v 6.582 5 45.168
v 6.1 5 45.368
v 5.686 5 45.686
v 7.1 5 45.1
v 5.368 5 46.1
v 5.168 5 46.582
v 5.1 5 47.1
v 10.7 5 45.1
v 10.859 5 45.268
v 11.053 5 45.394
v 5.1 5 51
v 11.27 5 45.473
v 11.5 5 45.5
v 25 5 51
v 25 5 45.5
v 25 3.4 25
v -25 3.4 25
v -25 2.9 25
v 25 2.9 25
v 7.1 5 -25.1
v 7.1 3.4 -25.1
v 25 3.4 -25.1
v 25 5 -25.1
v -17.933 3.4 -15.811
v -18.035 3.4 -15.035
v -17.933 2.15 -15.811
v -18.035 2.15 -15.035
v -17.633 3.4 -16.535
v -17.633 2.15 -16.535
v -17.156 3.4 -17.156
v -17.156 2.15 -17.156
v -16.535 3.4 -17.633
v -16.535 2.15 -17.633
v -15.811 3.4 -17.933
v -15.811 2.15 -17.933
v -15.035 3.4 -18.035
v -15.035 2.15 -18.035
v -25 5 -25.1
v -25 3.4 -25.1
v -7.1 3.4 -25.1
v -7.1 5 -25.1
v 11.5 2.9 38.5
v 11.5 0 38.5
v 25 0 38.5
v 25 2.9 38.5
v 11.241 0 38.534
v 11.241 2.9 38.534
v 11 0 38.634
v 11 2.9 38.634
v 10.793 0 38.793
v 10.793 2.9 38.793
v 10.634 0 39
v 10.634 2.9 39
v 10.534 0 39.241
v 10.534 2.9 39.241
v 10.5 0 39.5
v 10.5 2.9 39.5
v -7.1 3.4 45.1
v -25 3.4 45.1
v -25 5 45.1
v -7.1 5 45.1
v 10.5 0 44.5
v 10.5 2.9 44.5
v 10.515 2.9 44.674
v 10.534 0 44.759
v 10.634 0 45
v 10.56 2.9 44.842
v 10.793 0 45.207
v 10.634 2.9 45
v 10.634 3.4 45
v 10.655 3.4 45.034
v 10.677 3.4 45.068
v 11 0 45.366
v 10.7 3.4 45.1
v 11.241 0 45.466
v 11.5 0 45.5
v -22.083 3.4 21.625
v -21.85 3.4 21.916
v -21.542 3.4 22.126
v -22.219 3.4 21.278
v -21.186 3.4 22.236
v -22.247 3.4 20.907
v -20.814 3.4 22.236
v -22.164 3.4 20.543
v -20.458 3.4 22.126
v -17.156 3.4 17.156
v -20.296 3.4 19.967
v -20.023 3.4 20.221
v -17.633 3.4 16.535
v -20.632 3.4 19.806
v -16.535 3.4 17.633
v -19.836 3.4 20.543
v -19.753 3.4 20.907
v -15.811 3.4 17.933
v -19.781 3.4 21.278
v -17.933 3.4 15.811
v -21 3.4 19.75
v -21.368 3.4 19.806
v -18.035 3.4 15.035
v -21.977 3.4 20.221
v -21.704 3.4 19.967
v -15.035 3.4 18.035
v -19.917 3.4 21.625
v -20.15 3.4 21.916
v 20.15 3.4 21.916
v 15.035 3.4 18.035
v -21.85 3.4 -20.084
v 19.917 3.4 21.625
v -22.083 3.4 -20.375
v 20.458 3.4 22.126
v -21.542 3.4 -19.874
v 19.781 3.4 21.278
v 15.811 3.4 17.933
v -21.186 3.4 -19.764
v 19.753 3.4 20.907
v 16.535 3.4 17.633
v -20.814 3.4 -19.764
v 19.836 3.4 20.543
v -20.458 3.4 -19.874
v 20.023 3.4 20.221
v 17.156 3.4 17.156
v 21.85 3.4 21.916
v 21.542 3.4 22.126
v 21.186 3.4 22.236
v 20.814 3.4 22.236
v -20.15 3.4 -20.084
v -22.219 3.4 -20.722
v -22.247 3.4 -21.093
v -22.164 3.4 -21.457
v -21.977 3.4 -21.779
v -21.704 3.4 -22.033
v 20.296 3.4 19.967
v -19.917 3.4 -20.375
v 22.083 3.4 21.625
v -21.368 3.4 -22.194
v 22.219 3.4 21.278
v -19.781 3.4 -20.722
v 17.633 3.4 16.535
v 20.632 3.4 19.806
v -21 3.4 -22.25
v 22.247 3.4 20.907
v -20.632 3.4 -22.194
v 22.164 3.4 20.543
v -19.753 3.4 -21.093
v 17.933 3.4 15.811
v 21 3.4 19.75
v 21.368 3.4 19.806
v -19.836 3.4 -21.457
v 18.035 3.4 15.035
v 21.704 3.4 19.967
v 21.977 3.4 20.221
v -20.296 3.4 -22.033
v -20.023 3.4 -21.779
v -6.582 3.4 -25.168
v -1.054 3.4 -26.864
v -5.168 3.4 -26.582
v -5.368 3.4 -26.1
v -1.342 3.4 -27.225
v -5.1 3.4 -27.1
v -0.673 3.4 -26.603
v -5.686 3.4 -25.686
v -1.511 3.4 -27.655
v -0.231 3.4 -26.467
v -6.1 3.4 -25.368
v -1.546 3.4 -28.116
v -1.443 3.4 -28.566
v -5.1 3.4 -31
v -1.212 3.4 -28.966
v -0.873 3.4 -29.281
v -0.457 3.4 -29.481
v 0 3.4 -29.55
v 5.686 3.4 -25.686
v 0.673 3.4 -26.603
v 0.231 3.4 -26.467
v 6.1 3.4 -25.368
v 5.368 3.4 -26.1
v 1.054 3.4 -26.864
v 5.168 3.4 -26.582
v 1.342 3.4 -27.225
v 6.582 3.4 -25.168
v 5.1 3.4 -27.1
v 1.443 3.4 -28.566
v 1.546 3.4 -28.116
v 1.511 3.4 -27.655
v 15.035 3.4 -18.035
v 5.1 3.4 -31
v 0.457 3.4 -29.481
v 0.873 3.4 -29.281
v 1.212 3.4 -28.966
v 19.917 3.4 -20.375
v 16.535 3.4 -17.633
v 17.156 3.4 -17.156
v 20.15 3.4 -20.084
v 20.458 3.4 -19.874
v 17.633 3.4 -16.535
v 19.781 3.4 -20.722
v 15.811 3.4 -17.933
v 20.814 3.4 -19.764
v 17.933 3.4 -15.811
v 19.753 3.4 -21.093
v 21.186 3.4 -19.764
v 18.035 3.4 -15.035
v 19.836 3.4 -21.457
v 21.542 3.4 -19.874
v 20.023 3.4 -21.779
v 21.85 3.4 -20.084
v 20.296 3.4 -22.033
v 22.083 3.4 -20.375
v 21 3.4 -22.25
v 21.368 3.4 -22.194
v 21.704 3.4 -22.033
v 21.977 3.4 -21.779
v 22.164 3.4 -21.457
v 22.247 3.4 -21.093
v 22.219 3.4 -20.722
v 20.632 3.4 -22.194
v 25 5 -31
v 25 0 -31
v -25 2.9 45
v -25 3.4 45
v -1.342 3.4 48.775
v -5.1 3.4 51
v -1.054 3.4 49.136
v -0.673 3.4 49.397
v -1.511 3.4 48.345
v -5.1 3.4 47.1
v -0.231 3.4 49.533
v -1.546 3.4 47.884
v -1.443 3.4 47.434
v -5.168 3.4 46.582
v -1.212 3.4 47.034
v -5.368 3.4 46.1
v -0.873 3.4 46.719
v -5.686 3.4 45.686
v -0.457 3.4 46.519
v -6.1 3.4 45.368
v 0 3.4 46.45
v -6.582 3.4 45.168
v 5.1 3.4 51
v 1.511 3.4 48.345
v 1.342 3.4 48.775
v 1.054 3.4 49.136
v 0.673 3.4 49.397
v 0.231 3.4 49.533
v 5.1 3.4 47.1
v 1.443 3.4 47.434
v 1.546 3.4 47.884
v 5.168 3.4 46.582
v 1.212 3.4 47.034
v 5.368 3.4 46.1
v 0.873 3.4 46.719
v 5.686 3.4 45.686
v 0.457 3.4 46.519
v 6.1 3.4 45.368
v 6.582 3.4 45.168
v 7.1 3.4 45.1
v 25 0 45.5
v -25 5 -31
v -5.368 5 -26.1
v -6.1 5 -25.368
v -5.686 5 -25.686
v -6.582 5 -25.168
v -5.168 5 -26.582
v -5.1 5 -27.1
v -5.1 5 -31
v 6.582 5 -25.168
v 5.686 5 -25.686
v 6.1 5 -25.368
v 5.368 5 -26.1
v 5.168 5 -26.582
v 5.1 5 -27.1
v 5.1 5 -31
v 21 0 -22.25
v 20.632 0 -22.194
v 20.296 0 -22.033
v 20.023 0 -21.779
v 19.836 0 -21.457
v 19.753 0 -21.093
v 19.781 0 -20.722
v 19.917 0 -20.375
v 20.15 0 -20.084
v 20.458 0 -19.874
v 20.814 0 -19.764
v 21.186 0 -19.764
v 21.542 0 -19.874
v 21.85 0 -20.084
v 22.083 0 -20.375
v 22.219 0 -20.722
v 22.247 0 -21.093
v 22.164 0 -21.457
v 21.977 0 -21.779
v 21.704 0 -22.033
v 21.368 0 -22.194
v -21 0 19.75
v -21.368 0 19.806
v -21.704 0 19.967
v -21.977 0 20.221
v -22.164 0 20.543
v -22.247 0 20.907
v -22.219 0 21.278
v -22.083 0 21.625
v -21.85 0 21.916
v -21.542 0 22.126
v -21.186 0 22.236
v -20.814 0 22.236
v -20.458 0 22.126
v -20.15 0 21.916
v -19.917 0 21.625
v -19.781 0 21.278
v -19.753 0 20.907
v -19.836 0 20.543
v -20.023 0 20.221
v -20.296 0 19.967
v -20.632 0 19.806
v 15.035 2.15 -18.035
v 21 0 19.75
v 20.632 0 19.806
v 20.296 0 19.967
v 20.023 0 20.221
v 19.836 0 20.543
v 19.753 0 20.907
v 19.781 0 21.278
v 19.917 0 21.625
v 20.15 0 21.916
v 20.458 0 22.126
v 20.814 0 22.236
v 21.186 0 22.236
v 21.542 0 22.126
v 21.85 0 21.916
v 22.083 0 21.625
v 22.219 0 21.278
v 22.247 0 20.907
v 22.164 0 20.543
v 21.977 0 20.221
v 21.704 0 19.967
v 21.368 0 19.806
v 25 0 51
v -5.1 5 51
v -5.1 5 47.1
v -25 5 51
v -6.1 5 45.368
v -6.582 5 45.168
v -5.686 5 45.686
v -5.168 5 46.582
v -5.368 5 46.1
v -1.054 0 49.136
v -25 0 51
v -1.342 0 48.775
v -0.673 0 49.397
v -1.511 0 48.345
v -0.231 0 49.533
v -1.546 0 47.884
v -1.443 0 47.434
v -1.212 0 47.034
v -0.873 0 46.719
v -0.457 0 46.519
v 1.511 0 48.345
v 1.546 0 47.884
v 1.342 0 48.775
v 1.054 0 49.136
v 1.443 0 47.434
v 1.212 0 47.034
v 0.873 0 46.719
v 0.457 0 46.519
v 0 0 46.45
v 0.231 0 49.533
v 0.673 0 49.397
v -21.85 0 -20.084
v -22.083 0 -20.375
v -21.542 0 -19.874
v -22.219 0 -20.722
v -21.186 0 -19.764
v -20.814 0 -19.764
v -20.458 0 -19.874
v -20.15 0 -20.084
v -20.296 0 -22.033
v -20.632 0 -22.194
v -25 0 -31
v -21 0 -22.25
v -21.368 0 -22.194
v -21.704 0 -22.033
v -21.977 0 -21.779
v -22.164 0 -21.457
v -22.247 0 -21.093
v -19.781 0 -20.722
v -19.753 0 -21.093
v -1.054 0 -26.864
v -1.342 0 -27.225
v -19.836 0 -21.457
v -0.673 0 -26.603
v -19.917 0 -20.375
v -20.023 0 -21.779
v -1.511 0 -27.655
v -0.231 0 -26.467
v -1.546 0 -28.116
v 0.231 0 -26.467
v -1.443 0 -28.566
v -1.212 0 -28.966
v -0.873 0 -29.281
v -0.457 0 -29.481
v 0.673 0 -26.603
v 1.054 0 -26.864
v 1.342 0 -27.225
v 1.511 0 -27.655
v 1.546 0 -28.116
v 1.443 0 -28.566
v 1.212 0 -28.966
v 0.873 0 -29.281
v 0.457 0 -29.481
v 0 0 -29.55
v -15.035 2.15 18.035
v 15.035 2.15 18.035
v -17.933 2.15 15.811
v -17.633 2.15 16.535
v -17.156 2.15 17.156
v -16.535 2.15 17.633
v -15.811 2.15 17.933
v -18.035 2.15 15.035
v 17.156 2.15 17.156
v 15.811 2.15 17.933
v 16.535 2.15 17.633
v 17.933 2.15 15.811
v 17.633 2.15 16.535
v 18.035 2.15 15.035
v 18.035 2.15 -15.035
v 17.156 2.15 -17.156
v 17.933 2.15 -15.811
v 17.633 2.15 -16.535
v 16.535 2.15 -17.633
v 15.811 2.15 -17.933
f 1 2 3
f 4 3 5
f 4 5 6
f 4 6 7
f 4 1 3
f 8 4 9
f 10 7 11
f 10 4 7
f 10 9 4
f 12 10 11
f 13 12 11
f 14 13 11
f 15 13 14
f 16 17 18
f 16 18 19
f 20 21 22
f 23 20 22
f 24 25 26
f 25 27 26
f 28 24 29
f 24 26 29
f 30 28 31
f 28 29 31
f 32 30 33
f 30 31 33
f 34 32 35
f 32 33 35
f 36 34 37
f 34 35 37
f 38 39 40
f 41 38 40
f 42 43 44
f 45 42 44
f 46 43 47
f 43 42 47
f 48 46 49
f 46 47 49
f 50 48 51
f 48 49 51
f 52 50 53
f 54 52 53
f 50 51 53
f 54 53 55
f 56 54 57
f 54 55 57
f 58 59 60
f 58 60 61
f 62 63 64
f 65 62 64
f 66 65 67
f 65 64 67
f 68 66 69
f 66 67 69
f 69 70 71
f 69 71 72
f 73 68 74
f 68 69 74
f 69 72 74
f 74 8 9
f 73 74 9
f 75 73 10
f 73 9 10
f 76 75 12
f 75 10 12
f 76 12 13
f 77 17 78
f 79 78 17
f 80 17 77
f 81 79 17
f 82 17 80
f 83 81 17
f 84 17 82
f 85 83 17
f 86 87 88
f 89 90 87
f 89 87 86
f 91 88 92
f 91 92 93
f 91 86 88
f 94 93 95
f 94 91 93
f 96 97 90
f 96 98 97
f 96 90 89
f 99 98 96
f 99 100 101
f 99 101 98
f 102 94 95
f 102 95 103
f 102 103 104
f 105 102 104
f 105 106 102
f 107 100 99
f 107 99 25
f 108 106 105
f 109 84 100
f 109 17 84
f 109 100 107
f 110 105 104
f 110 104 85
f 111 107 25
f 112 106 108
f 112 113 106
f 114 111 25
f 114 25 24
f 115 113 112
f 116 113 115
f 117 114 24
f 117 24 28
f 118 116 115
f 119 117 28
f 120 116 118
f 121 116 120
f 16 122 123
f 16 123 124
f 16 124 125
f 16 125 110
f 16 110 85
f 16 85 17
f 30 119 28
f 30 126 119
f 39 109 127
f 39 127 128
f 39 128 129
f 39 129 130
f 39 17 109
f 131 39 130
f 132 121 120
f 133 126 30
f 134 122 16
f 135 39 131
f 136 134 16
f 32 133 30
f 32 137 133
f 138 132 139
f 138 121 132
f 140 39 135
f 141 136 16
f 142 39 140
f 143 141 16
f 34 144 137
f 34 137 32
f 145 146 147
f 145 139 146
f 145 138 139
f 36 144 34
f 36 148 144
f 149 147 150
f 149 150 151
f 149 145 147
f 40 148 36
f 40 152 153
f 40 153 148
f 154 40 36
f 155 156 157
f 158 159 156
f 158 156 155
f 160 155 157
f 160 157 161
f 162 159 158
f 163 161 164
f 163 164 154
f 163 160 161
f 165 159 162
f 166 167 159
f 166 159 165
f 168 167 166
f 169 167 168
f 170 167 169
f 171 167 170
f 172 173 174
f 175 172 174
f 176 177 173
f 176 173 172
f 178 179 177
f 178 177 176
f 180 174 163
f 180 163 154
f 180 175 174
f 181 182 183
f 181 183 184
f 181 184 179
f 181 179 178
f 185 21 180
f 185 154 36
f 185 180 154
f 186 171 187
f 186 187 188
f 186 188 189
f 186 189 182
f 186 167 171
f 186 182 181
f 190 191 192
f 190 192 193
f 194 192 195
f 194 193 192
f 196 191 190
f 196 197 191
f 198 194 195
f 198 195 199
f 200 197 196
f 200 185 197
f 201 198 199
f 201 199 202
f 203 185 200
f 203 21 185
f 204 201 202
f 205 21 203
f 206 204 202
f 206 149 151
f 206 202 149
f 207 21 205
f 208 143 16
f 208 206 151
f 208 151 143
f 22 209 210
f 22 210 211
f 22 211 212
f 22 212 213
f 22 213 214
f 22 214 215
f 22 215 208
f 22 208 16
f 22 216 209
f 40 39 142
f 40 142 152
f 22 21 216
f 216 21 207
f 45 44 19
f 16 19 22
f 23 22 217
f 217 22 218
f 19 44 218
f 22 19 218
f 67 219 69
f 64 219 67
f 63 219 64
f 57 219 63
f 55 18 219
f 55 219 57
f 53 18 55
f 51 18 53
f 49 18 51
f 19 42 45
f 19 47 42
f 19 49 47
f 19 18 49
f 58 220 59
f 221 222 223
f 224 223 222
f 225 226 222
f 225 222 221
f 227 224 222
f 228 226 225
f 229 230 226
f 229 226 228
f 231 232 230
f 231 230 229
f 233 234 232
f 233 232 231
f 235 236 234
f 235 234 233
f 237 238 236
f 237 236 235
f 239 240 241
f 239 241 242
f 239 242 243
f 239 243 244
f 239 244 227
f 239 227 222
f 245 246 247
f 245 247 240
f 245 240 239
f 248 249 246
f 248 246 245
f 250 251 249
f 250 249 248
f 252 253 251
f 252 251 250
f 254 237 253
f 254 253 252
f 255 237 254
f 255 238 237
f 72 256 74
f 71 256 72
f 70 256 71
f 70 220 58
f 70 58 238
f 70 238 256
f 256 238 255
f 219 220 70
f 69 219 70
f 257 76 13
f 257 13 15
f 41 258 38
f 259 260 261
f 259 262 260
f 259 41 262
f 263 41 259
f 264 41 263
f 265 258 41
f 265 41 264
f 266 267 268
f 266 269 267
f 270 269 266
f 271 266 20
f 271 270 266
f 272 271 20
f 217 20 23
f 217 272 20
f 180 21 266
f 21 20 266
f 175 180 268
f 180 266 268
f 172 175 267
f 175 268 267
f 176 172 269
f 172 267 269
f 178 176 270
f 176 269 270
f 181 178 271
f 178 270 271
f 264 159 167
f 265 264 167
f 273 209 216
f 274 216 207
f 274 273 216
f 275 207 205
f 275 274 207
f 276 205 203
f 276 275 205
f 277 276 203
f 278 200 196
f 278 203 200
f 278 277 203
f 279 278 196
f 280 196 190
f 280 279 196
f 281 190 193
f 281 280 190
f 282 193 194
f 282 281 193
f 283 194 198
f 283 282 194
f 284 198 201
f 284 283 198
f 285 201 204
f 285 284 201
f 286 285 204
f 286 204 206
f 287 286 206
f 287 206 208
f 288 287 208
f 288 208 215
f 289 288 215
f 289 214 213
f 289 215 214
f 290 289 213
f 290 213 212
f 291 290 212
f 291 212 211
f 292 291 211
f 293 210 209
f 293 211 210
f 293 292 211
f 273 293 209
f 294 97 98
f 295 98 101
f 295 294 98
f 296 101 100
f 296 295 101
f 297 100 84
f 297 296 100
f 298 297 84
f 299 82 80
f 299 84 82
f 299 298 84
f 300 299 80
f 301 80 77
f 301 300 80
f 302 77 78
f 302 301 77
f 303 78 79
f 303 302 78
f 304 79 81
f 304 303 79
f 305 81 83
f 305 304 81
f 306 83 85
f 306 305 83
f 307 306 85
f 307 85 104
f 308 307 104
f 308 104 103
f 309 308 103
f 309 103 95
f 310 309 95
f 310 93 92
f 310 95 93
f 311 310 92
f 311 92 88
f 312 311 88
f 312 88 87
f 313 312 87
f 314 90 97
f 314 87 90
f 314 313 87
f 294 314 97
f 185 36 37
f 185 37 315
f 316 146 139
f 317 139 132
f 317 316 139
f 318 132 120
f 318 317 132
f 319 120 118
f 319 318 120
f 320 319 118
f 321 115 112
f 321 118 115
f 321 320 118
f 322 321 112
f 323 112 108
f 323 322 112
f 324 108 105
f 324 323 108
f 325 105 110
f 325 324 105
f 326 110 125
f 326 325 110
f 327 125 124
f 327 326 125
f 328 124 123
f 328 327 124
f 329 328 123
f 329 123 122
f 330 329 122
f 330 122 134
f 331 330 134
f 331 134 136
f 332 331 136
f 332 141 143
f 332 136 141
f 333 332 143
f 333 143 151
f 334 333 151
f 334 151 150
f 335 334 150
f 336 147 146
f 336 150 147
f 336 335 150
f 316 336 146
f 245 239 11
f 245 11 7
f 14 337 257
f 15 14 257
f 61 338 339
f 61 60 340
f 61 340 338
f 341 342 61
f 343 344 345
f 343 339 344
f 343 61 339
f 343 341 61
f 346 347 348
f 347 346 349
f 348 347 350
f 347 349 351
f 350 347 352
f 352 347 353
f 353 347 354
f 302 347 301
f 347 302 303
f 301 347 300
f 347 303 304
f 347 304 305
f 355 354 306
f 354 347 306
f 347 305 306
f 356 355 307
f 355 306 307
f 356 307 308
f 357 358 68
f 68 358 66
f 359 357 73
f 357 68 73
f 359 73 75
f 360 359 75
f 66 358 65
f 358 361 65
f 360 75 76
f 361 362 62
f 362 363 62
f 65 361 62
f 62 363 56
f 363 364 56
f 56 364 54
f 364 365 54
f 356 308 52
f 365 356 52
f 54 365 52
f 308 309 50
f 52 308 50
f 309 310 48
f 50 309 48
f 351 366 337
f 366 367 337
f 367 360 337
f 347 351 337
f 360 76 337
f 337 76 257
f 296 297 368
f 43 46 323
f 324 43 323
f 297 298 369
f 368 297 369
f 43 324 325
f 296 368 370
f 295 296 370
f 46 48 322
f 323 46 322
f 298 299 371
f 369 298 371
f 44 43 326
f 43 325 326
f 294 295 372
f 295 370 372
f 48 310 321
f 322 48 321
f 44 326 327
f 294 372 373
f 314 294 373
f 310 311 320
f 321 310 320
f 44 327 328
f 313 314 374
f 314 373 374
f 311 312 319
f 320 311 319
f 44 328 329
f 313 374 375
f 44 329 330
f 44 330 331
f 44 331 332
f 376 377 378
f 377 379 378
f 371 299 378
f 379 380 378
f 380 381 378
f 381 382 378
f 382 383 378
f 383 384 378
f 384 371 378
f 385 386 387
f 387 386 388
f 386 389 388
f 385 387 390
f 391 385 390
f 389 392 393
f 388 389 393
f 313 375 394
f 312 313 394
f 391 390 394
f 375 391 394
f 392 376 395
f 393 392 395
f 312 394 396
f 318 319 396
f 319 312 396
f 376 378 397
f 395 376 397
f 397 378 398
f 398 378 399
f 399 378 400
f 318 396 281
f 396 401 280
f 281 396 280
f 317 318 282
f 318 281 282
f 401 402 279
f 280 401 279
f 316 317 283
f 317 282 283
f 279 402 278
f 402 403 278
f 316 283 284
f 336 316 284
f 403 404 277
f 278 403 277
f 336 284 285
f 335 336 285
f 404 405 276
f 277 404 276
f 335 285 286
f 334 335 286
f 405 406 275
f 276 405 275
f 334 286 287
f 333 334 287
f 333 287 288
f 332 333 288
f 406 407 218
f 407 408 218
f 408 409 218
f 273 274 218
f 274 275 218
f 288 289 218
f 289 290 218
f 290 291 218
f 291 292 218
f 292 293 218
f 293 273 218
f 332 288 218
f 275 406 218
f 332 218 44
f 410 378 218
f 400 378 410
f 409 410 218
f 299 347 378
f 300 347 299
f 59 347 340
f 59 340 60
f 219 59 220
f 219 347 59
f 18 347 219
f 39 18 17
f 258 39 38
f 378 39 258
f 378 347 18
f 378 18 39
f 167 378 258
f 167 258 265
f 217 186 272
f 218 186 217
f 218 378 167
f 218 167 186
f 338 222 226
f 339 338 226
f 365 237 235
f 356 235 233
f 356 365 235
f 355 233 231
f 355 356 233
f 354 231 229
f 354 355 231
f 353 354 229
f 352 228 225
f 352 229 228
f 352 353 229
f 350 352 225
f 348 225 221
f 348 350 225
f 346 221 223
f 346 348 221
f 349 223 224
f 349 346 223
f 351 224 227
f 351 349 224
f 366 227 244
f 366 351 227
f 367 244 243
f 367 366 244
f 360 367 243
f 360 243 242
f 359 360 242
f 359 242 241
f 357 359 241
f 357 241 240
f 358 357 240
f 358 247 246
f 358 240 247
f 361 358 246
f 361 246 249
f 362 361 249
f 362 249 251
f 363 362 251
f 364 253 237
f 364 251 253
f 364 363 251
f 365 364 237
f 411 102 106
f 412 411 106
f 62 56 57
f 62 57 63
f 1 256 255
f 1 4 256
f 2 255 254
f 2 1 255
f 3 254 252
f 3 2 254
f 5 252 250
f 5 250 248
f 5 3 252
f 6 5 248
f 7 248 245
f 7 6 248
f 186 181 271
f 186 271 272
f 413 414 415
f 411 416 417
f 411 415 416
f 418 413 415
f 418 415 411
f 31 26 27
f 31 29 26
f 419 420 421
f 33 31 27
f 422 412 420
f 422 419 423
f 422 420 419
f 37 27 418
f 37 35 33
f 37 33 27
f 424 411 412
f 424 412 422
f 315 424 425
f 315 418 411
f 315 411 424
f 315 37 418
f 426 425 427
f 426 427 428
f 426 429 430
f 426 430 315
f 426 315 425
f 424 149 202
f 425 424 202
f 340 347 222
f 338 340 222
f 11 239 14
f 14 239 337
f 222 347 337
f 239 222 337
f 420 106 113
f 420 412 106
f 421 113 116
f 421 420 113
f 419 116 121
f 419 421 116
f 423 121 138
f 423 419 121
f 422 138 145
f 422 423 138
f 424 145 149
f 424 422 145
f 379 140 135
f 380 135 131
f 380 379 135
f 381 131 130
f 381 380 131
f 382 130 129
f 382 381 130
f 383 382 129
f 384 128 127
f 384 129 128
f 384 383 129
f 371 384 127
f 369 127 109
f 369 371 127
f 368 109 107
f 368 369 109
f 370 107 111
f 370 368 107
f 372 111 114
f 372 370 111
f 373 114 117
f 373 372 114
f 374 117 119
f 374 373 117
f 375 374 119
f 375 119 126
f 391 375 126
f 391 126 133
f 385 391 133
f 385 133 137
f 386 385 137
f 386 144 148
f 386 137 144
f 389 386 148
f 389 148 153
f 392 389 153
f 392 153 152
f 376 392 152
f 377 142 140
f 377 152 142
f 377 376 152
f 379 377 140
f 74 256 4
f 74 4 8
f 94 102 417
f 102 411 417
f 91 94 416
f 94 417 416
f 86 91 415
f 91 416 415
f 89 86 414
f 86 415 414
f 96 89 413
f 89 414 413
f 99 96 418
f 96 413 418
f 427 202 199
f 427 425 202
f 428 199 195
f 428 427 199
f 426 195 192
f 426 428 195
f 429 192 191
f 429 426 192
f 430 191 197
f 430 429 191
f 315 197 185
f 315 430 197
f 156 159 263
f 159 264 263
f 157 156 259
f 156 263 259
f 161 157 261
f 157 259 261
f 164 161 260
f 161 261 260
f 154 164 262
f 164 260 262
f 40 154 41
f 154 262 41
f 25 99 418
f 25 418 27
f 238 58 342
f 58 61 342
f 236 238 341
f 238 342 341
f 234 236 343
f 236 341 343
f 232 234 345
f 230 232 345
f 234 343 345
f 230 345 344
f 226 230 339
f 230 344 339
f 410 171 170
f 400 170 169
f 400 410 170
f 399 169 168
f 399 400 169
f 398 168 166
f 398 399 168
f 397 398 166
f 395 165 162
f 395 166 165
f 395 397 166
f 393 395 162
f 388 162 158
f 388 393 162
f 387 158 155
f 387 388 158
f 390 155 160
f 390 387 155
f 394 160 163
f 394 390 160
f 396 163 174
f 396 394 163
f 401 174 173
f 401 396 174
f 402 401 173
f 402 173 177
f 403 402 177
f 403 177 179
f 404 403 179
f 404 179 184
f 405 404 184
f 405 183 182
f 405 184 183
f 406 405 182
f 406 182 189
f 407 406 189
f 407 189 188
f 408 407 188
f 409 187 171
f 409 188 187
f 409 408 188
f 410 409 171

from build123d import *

# Parameters (mm, degrees)
SKETCH_202_W           = 50
SKETCH_202_H           = 82
EXTRUDE_1_DEPTH        = 3.4
SKETCH_2_W             = 36.07
SKETCH_2_H             = 36.07
ADR1399KEZ_DEPTH       = 1.25
SKETCH_3_R             = 1.25
SKETCH_3_R_2           = 1.55
CUT_EXTRUDE_963_DEPTH  = 57.899560631
SKETCH_5_W             = 50
SKETCH_5_H             = 20
CUT_EXTRUDE_1417_DEPTH = 0.5
FILLET_1474_R          = 3
SKETCH_9_W             = 19.9
SKETCH_9_H             = 5.9
EXTRUDE_2_DEPTH        = 1.6
SKETCH_7_W             = 14.5
SKETCH_7_H             = 7
CUT_EXTRUDE_7_DEPTH    = 58.017541161
FILLET_3_R             = 1
FILLET_4_R             = 2


with BuildPart() as part:
    # Sketch 202 → Бобышка-Вытянуть1 (new body)
    with BuildSketch(Plane(origin=(0, 0, 0), x_dir=(1, 0, 0), z_dir=(0, 1, 0))):
        with Locations((0, -10)):
            Rectangle(SKETCH_202_W, SKETCH_202_H)
    extrude(amount=EXTRUDE_1_DEPTH)

    # Эскиз2 → Выемка для ADR1399KEZ (cut)
    with BuildSketch(Plane(origin=(0, 3.4, 0), x_dir=(1, 0, 0), z_dir=(0, 1, 0))):
        Rectangle(SKETCH_2_W, SKETCH_2_H)
    extrude(amount=-ADR1399KEZ_DEPTH, mode=Mode.SUBTRACT)

    # Эскиз3 → Cut-Extrude 963 (cut, through all)
    with BuildSketch(Plane(origin=(0, 0, 0), x_dir=(1, 0, 0), z_dir=(0, 1, 0))):
        with Locations(Location((-21, 21, 0), (0, 0, 90))):
            Circle(SKETCH_3_R)
        with Locations(Location((21, 21, 0), (0, 0, 90))):
            Circle(SKETCH_3_R)
        with Locations(Location((-21, -21, 0), (0, 0, 90))):
            Circle(SKETCH_3_R)
        with Locations(Location((21, -21, 0), (0, 0, 90))):
            Circle(SKETCH_3_R)
        with Locations(Location((0, 28, 0), (0, 0, 90))):
            Circle(SKETCH_3_R_2)
        with Locations(Location((0, -48, 0), (0, 0, 90))):
            Circle(SKETCH_3_R_2)
    extrude(amount=CUT_EXTRUDE_963_DEPTH, mode=Mode.SUBTRACT)

    # Эскиз5 → Cut-Extrude 1417 (cut)
    with BuildSketch(Plane(origin=(0, 3.4, 0), x_dir=(1, 0, 0), z_dir=(0, 1, 0))):
        with Locations((0, -35)):
            Rectangle(SKETCH_5_W, SKETCH_5_H)
    extrude(amount=-CUT_EXTRUDE_1417_DEPTH, mode=Mode.SUBTRACT)

    # Fillet 1474
    fillet_1474_edges = [part.edges().sort_by_distance(p)[0] for p in [
        (18.035, 2.775, -18.035),
        (18.035, 2.775, 18.035),
        (-18.035, 2.775, 18.035),
        (-18.035, 2.775, -18.035),
    ]]
    fillet(fillet_1474_edges, radius=FILLET_1474_R)

    # Эскиз9 → Бобышка-Вытянуть2 (add)
    with BuildSketch(Plane(origin=(0, 3.4, 0), x_dir=(1, 0, 0), z_dir=(0, 1, 0))):
        with Locations((-15.05, 28.05)):
            Rectangle(SKETCH_9_W, SKETCH_9_H)
        with Locations((15.05, 28.05)):
            Rectangle(SKETCH_9_W, SKETCH_9_H)
        with Locations((-15.05, -48.05)):
            Rectangle(SKETCH_9_W, SKETCH_9_H)
        with Locations((15.05, -48.05)):
            Rectangle(SKETCH_9_W, SKETCH_9_H)
    extrude(amount=EXTRUDE_2_DEPTH)

    # Эскиз7 → Вырез-Вытянуть7 (cut, through all)
    with BuildSketch(Plane.XZ):
        with Locations((17.75, 42)):
            Rectangle(SKETCH_7_W, SKETCH_7_H)
    extrude(amount=-CUT_EXTRUDE_7_DEPTH, mode=Mode.SUBTRACT)

    # Скругление3
    fillet_3_edges = [part.edges().sort_by_distance(p)[0] for p in [
        (10.5, 1.45, 38.5),
        (10.5, 2.5, 45.5),
    ]]
    fillet(fillet_3_edges, radius=FILLET_3_R)

    # Скругление4
    fillet_4_edges = [part.edges().sort_by_distance(p)[0] for p in [
        (5.1, 4.2, -25.1),
        (-5.1, 4.2, 45.1),
        (5.1, 4.2, 45.1),
        (-5.1, 4.2, -25.1),
    ]]
    fillet(fillet_4_edges, radius=FILLET_4_R)


solid = part.part
